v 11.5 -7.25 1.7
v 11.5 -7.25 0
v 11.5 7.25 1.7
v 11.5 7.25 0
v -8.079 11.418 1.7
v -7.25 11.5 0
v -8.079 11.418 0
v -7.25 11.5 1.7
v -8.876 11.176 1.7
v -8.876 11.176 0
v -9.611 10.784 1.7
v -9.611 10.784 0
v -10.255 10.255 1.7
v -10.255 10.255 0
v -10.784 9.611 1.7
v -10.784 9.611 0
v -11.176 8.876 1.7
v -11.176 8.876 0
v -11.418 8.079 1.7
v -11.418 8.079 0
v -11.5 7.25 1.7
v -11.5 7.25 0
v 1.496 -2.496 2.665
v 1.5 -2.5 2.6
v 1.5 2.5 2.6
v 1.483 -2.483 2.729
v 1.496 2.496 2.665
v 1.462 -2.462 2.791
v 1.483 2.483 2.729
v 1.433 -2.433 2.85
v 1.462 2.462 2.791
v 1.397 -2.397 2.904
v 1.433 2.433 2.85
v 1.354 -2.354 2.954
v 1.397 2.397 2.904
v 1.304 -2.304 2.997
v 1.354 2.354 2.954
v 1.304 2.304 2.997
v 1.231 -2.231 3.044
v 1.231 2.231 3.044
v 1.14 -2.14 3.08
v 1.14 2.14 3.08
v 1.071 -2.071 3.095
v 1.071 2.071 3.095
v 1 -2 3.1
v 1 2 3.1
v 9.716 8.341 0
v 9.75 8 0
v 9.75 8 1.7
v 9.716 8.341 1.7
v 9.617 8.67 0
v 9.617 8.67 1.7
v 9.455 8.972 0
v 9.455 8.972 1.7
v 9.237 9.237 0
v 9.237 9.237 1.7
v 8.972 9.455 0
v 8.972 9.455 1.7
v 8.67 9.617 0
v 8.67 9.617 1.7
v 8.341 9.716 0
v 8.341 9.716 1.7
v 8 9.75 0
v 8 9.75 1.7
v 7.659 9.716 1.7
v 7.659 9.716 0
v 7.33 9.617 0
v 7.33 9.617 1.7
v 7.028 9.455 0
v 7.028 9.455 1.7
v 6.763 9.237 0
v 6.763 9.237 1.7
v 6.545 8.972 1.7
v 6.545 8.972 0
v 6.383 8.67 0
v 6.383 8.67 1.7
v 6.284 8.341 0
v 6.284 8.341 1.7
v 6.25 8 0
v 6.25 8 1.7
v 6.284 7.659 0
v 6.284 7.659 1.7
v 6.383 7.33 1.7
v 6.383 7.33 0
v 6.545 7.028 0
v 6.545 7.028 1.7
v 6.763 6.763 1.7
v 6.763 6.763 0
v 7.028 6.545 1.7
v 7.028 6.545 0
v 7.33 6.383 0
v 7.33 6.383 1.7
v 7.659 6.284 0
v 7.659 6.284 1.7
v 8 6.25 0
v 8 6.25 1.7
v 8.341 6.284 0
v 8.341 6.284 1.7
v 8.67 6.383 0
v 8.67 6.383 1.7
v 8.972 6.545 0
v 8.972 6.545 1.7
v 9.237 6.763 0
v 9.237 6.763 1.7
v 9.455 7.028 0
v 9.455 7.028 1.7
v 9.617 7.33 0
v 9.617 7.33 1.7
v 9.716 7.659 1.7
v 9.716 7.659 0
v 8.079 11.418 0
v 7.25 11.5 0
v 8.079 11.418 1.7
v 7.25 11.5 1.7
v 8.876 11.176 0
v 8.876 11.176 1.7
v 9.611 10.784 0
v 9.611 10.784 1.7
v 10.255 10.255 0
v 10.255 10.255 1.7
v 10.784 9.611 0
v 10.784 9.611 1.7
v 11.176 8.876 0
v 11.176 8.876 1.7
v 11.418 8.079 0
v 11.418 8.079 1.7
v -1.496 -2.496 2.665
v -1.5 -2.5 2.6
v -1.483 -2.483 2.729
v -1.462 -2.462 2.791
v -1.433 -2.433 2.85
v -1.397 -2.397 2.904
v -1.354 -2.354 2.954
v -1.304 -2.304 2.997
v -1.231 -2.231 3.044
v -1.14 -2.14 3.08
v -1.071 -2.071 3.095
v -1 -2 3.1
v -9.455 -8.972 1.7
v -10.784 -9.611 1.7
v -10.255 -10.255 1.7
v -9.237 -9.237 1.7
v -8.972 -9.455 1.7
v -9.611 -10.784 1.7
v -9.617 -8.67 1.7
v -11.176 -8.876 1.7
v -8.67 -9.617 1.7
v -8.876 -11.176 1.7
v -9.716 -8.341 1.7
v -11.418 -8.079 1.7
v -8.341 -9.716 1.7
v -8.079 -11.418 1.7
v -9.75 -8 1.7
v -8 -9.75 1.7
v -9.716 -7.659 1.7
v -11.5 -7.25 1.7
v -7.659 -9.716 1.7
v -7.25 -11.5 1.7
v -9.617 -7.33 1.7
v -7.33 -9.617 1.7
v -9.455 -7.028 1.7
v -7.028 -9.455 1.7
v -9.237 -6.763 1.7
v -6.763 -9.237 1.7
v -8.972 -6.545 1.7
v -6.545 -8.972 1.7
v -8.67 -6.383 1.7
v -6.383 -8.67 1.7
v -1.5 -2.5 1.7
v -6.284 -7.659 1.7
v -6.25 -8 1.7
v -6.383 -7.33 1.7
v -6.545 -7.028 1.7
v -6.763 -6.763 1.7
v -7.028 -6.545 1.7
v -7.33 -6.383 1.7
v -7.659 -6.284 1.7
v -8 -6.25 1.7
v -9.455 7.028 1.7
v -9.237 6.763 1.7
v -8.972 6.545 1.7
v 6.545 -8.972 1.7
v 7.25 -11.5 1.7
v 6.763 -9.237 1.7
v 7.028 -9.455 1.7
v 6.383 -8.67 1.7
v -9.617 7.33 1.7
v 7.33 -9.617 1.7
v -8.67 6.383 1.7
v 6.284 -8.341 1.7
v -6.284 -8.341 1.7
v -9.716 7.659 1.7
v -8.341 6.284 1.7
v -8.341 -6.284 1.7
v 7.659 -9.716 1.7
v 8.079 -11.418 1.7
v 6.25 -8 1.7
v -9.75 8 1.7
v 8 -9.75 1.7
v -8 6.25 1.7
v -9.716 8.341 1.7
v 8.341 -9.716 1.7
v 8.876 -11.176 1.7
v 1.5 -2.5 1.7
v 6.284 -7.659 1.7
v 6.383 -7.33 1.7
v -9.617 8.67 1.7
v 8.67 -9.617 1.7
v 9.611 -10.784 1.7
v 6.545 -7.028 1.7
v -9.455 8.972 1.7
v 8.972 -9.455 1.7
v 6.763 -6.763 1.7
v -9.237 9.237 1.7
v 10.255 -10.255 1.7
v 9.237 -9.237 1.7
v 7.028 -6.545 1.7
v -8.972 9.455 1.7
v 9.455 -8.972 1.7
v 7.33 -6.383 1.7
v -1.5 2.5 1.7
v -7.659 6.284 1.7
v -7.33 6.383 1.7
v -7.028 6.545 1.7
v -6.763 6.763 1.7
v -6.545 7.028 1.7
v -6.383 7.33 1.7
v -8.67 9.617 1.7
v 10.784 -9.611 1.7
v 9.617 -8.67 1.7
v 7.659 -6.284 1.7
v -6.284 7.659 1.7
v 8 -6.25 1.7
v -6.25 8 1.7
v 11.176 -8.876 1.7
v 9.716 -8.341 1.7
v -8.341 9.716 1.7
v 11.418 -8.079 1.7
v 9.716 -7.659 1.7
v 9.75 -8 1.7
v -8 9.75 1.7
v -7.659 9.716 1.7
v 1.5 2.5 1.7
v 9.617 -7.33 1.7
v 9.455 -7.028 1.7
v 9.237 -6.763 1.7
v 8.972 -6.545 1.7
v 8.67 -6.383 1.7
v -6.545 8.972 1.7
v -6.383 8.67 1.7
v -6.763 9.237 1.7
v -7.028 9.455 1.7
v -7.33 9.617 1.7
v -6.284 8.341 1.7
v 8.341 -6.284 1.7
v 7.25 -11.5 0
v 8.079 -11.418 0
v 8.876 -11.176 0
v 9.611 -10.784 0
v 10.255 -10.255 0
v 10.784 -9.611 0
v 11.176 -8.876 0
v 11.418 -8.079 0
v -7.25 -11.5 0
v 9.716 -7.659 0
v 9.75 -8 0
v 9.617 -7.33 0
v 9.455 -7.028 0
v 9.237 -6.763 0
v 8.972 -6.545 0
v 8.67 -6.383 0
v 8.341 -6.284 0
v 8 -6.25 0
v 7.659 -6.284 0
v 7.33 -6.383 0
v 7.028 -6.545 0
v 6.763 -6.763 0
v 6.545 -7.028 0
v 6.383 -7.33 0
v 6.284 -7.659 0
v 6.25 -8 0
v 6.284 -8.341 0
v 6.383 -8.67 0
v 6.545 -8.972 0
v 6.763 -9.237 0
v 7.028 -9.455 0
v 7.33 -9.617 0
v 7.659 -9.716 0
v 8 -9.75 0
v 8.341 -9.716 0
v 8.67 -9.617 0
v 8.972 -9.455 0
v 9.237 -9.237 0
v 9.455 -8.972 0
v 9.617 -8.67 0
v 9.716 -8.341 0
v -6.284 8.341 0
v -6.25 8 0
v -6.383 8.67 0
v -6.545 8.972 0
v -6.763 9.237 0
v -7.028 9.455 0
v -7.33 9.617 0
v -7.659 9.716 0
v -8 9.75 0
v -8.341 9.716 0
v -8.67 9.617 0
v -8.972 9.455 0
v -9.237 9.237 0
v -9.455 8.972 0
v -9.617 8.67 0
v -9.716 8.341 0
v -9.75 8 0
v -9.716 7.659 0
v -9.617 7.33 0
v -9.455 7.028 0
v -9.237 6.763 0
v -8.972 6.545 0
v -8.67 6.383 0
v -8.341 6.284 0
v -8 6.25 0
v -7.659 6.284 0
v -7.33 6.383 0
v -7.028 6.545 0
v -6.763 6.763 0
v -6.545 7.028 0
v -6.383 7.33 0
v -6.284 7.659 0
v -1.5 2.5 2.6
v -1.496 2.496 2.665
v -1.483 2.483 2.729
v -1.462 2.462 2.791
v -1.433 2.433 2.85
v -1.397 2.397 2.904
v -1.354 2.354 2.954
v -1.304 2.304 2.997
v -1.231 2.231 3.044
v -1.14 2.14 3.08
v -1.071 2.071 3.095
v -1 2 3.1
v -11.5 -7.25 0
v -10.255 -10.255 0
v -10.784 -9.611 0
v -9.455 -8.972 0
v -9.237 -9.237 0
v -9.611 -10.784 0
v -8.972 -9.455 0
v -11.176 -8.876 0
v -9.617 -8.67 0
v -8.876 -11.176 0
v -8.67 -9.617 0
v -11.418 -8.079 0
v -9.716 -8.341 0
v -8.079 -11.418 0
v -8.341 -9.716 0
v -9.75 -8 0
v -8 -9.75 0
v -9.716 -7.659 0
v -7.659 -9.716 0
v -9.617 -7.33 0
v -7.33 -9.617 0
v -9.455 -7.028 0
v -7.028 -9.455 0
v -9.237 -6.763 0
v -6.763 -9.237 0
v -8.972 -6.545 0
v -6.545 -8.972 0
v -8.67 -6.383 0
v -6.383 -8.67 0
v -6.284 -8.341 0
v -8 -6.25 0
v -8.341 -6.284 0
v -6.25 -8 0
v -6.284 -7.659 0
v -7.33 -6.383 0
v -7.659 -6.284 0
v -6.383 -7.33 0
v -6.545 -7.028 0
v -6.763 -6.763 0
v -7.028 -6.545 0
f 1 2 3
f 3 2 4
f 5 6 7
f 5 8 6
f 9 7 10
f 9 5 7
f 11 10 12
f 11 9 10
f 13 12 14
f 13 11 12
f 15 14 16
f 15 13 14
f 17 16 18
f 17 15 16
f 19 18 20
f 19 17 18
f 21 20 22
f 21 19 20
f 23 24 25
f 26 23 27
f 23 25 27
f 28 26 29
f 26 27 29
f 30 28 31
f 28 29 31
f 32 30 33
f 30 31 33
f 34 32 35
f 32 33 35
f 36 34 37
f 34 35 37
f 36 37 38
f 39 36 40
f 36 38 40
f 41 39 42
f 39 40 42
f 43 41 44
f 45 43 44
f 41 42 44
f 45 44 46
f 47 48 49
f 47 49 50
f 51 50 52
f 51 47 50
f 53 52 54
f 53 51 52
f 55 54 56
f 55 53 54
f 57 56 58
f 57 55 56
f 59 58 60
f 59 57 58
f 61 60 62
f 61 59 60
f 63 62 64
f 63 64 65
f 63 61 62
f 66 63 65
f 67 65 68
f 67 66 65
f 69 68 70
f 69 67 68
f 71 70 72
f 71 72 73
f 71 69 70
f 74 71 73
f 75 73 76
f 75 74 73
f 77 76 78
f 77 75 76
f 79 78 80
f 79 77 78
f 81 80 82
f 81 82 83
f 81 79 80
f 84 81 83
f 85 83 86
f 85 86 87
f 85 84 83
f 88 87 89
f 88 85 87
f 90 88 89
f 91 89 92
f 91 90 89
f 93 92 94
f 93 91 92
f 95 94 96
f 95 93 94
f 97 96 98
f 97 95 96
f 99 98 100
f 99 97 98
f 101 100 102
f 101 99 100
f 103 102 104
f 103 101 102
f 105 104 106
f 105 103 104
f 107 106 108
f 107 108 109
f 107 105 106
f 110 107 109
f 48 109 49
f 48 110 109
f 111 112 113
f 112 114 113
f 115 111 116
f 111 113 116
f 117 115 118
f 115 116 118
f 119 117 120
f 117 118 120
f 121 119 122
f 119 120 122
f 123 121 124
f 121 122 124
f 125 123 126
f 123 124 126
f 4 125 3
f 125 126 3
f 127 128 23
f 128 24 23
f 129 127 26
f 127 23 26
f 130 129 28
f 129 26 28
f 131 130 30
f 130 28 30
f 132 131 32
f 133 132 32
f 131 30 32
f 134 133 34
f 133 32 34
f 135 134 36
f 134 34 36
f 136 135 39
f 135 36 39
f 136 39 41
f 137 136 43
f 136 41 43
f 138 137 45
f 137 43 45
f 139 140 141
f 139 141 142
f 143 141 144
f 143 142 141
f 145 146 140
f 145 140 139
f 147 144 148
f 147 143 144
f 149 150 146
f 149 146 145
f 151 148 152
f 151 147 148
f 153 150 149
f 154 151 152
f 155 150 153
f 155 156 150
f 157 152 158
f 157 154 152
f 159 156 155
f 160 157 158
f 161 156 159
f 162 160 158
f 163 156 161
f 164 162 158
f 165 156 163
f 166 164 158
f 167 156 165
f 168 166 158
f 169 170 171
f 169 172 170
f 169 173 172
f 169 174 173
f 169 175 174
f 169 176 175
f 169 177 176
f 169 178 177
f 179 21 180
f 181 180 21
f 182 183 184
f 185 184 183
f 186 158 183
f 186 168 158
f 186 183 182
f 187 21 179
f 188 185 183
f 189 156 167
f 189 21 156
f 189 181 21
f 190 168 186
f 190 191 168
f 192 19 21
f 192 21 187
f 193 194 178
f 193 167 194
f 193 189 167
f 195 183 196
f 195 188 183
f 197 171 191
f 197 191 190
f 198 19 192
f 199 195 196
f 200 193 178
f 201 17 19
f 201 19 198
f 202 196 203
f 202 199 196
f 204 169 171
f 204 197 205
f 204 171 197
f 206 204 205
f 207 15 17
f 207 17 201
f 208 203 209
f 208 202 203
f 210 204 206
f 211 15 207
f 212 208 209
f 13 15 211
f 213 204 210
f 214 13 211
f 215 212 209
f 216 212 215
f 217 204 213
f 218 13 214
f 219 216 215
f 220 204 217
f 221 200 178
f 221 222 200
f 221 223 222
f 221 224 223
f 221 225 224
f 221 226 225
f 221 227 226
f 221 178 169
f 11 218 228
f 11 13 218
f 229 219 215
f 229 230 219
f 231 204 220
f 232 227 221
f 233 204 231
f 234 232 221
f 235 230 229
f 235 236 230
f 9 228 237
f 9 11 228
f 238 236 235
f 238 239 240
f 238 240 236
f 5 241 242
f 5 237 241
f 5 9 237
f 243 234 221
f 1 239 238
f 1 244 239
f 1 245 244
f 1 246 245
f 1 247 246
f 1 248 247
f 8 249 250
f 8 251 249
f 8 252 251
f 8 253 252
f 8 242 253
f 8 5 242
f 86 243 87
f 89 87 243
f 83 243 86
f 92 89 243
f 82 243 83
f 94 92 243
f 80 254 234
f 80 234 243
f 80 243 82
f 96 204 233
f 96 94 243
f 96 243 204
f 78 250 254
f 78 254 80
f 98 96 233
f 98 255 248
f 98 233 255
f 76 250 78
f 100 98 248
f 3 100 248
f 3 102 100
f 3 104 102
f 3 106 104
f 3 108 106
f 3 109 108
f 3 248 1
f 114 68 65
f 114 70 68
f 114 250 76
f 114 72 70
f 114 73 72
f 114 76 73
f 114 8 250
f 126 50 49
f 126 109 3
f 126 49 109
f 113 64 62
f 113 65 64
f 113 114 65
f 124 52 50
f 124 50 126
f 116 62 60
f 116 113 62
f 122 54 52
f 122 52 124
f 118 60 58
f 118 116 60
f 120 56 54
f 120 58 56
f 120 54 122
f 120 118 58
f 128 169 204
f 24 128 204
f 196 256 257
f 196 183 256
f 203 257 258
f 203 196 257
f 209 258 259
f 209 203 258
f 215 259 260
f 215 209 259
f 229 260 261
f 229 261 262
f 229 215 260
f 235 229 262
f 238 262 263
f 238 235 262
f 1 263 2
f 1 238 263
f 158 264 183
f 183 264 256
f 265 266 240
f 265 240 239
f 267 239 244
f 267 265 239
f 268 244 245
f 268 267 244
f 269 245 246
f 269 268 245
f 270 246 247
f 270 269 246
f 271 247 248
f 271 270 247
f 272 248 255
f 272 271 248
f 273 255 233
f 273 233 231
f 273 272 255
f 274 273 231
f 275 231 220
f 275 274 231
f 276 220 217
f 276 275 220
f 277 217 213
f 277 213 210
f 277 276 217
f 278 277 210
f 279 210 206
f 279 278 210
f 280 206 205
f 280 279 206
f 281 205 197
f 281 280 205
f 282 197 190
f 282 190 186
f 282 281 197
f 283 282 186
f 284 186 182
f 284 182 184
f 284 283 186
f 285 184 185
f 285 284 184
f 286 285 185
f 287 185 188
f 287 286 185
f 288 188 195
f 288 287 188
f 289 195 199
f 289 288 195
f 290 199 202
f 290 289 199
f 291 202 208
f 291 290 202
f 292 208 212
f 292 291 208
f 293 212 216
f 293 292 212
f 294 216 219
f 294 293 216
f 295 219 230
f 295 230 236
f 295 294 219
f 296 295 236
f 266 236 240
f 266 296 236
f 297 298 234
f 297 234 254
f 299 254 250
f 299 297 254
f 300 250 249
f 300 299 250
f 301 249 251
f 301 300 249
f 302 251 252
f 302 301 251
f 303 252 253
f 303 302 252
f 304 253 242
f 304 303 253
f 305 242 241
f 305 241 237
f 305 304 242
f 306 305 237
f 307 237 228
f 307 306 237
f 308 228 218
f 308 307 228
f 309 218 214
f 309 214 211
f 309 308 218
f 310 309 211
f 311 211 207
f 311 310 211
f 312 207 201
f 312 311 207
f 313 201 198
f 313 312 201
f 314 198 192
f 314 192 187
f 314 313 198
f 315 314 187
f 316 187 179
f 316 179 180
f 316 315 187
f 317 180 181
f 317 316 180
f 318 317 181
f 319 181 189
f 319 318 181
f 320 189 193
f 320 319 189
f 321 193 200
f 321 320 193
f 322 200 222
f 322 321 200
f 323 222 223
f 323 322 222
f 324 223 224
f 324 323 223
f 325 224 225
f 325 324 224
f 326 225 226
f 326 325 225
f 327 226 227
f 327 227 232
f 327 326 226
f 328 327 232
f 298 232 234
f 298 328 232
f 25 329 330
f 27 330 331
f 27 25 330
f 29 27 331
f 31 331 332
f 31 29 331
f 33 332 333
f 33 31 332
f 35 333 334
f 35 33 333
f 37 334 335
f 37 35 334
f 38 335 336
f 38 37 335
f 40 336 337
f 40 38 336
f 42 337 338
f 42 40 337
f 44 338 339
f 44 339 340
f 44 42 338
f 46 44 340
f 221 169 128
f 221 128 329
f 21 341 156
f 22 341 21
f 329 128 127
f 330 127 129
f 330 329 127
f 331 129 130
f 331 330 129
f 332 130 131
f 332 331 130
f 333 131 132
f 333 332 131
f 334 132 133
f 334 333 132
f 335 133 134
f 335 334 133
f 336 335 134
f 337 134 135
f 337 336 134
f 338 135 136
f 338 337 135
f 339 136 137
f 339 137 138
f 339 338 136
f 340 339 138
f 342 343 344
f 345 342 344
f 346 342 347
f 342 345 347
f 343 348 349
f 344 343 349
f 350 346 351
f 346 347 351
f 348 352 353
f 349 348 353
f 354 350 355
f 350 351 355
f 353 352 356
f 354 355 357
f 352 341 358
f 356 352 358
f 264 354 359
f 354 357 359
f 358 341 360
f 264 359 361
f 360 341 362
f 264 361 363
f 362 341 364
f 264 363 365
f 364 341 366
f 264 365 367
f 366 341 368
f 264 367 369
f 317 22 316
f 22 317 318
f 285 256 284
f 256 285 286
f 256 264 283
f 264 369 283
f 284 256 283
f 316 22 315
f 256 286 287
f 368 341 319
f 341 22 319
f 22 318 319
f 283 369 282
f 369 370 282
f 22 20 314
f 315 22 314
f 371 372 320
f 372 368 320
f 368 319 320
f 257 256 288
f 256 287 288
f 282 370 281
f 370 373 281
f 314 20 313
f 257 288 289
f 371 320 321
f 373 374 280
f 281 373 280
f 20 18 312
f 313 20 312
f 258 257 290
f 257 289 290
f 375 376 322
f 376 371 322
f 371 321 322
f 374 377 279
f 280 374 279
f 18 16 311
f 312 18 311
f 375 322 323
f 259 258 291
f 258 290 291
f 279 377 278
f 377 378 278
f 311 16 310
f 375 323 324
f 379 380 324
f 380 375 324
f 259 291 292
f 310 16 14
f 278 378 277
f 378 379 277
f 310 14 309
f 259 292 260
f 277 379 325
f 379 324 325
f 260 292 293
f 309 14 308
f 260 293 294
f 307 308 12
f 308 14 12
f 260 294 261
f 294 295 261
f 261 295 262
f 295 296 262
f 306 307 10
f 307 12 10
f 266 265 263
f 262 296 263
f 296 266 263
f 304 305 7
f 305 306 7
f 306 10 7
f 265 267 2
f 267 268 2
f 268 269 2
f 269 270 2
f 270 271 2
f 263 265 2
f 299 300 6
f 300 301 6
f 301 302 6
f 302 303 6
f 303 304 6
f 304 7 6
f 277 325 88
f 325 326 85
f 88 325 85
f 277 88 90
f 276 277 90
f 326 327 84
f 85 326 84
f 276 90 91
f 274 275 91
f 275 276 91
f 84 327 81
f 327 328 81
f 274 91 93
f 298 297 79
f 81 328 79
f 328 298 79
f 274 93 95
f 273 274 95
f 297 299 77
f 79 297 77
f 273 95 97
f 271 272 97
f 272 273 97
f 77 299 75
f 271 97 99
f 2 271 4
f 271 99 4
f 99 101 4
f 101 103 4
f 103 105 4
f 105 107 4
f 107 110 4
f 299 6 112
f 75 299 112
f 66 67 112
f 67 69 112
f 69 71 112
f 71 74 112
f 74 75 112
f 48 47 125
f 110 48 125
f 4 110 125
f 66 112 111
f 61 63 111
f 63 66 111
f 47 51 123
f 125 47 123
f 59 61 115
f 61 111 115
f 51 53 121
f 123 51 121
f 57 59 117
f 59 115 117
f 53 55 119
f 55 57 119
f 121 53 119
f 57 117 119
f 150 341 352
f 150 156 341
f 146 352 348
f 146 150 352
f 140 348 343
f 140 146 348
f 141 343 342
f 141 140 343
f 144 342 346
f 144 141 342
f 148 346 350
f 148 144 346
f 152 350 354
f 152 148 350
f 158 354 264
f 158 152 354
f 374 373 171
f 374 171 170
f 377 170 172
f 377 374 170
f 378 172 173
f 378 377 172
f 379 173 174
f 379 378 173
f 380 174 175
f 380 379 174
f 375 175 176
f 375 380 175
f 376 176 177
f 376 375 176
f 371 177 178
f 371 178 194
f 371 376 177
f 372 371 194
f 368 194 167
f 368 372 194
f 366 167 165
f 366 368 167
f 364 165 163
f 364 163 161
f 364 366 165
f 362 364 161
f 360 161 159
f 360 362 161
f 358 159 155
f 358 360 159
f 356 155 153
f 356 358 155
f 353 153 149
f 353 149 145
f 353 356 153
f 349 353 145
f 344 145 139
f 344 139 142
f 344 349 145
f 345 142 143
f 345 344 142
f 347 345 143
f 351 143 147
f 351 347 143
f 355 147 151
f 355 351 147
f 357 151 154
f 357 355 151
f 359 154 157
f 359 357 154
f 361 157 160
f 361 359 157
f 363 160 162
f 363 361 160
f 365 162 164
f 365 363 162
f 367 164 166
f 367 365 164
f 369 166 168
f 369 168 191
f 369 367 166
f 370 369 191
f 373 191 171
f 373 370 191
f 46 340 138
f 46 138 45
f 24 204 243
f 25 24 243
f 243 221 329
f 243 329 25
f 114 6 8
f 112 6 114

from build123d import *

# Parameters (mm, degrees)
SKETCH_2_W      = 23
SKETCH_2_H      = 23
SKETCH_2_R      = 1.75
EXTRUDE_1_DEPTH = 1.7
SKETCH_2_3_W    = 3
SKETCH_2_3_H    = 5
EXTRUDE_2_DEPTH = 3.1
FILLET_2_R      = 4.25
FILLET_3_R      = 4.25
FILLET_4_R      = 4.25
FILLET_5_R      = 4.25
FILLET_6_R      = 0.5


with BuildPart() as part:
    # 草图2 → 凸台-拉伸1 (new body)
    with BuildSketch(Plane.XY):
        Rectangle(SKETCH_2_W, SKETCH_2_H)
        with Locations((8, 8)):
            Circle(SKETCH_2_R, mode=Mode.SUBTRACT)
        with Locations((-8, 8)):
            Circle(SKETCH_2_R, mode=Mode.SUBTRACT)
        with Locations((8, -8)):
            Circle(SKETCH_2_R, mode=Mode.SUBTRACT)
        with Locations((-8, -8)):
            Circle(SKETCH_2_R, mode=Mode.SUBTRACT)
    extrude(amount=EXTRUDE_1_DEPTH)

    # 草图2<3> → 凸台-拉伸2 (add)
    with BuildSketch(Plane.XY):
        Rectangle(SKETCH_2_3_W, SKETCH_2_3_H)
    extrude(amount=EXTRUDE_2_DEPTH)

    # 圆角2
    fillet_2_edges = [part.edges().sort_by_distance(p)[0] for p in [
        (11.5, 11.5, 0.85),
    ]]
    fillet(fillet_2_edges, radius=FILLET_2_R)

    # 圆角3
    fillet_3_edges = [part.edges().sort_by_distance(p)[0] for p in [
        (-11.5, 11.5, 0.85),
    ]]
    fillet(fillet_3_edges, radius=FILLET_3_R)

    # 圆角4
    fillet_4_edges = [part.edges().sort_by_distance(p)[0] for p in [
        (-11.5, -11.5, 0.85),
    ]]
    fillet(fillet_4_edges, radius=FILLET_4_R)

    # 圆角5
    fillet_5_edges = [part.edges().sort_by_distance(p)[0] for p in [
        (11.5, -11.5, 0.85),
    ]]
    fillet(fillet_5_edges, radius=FILLET_5_R)

    # 圆角6
    fillet_6_edges = [part.edges().sort_by_distance(p)[0] for p in [
        (0, 2.5, 3.1),
        (1.5, 0, 3.1),
        (-1.5, 0, 3.1),
        (0, -2.5, 3.1),
    ]]
    fillet(fillet_6_edges, radius=FILLET_6_R)


solid = part.part
